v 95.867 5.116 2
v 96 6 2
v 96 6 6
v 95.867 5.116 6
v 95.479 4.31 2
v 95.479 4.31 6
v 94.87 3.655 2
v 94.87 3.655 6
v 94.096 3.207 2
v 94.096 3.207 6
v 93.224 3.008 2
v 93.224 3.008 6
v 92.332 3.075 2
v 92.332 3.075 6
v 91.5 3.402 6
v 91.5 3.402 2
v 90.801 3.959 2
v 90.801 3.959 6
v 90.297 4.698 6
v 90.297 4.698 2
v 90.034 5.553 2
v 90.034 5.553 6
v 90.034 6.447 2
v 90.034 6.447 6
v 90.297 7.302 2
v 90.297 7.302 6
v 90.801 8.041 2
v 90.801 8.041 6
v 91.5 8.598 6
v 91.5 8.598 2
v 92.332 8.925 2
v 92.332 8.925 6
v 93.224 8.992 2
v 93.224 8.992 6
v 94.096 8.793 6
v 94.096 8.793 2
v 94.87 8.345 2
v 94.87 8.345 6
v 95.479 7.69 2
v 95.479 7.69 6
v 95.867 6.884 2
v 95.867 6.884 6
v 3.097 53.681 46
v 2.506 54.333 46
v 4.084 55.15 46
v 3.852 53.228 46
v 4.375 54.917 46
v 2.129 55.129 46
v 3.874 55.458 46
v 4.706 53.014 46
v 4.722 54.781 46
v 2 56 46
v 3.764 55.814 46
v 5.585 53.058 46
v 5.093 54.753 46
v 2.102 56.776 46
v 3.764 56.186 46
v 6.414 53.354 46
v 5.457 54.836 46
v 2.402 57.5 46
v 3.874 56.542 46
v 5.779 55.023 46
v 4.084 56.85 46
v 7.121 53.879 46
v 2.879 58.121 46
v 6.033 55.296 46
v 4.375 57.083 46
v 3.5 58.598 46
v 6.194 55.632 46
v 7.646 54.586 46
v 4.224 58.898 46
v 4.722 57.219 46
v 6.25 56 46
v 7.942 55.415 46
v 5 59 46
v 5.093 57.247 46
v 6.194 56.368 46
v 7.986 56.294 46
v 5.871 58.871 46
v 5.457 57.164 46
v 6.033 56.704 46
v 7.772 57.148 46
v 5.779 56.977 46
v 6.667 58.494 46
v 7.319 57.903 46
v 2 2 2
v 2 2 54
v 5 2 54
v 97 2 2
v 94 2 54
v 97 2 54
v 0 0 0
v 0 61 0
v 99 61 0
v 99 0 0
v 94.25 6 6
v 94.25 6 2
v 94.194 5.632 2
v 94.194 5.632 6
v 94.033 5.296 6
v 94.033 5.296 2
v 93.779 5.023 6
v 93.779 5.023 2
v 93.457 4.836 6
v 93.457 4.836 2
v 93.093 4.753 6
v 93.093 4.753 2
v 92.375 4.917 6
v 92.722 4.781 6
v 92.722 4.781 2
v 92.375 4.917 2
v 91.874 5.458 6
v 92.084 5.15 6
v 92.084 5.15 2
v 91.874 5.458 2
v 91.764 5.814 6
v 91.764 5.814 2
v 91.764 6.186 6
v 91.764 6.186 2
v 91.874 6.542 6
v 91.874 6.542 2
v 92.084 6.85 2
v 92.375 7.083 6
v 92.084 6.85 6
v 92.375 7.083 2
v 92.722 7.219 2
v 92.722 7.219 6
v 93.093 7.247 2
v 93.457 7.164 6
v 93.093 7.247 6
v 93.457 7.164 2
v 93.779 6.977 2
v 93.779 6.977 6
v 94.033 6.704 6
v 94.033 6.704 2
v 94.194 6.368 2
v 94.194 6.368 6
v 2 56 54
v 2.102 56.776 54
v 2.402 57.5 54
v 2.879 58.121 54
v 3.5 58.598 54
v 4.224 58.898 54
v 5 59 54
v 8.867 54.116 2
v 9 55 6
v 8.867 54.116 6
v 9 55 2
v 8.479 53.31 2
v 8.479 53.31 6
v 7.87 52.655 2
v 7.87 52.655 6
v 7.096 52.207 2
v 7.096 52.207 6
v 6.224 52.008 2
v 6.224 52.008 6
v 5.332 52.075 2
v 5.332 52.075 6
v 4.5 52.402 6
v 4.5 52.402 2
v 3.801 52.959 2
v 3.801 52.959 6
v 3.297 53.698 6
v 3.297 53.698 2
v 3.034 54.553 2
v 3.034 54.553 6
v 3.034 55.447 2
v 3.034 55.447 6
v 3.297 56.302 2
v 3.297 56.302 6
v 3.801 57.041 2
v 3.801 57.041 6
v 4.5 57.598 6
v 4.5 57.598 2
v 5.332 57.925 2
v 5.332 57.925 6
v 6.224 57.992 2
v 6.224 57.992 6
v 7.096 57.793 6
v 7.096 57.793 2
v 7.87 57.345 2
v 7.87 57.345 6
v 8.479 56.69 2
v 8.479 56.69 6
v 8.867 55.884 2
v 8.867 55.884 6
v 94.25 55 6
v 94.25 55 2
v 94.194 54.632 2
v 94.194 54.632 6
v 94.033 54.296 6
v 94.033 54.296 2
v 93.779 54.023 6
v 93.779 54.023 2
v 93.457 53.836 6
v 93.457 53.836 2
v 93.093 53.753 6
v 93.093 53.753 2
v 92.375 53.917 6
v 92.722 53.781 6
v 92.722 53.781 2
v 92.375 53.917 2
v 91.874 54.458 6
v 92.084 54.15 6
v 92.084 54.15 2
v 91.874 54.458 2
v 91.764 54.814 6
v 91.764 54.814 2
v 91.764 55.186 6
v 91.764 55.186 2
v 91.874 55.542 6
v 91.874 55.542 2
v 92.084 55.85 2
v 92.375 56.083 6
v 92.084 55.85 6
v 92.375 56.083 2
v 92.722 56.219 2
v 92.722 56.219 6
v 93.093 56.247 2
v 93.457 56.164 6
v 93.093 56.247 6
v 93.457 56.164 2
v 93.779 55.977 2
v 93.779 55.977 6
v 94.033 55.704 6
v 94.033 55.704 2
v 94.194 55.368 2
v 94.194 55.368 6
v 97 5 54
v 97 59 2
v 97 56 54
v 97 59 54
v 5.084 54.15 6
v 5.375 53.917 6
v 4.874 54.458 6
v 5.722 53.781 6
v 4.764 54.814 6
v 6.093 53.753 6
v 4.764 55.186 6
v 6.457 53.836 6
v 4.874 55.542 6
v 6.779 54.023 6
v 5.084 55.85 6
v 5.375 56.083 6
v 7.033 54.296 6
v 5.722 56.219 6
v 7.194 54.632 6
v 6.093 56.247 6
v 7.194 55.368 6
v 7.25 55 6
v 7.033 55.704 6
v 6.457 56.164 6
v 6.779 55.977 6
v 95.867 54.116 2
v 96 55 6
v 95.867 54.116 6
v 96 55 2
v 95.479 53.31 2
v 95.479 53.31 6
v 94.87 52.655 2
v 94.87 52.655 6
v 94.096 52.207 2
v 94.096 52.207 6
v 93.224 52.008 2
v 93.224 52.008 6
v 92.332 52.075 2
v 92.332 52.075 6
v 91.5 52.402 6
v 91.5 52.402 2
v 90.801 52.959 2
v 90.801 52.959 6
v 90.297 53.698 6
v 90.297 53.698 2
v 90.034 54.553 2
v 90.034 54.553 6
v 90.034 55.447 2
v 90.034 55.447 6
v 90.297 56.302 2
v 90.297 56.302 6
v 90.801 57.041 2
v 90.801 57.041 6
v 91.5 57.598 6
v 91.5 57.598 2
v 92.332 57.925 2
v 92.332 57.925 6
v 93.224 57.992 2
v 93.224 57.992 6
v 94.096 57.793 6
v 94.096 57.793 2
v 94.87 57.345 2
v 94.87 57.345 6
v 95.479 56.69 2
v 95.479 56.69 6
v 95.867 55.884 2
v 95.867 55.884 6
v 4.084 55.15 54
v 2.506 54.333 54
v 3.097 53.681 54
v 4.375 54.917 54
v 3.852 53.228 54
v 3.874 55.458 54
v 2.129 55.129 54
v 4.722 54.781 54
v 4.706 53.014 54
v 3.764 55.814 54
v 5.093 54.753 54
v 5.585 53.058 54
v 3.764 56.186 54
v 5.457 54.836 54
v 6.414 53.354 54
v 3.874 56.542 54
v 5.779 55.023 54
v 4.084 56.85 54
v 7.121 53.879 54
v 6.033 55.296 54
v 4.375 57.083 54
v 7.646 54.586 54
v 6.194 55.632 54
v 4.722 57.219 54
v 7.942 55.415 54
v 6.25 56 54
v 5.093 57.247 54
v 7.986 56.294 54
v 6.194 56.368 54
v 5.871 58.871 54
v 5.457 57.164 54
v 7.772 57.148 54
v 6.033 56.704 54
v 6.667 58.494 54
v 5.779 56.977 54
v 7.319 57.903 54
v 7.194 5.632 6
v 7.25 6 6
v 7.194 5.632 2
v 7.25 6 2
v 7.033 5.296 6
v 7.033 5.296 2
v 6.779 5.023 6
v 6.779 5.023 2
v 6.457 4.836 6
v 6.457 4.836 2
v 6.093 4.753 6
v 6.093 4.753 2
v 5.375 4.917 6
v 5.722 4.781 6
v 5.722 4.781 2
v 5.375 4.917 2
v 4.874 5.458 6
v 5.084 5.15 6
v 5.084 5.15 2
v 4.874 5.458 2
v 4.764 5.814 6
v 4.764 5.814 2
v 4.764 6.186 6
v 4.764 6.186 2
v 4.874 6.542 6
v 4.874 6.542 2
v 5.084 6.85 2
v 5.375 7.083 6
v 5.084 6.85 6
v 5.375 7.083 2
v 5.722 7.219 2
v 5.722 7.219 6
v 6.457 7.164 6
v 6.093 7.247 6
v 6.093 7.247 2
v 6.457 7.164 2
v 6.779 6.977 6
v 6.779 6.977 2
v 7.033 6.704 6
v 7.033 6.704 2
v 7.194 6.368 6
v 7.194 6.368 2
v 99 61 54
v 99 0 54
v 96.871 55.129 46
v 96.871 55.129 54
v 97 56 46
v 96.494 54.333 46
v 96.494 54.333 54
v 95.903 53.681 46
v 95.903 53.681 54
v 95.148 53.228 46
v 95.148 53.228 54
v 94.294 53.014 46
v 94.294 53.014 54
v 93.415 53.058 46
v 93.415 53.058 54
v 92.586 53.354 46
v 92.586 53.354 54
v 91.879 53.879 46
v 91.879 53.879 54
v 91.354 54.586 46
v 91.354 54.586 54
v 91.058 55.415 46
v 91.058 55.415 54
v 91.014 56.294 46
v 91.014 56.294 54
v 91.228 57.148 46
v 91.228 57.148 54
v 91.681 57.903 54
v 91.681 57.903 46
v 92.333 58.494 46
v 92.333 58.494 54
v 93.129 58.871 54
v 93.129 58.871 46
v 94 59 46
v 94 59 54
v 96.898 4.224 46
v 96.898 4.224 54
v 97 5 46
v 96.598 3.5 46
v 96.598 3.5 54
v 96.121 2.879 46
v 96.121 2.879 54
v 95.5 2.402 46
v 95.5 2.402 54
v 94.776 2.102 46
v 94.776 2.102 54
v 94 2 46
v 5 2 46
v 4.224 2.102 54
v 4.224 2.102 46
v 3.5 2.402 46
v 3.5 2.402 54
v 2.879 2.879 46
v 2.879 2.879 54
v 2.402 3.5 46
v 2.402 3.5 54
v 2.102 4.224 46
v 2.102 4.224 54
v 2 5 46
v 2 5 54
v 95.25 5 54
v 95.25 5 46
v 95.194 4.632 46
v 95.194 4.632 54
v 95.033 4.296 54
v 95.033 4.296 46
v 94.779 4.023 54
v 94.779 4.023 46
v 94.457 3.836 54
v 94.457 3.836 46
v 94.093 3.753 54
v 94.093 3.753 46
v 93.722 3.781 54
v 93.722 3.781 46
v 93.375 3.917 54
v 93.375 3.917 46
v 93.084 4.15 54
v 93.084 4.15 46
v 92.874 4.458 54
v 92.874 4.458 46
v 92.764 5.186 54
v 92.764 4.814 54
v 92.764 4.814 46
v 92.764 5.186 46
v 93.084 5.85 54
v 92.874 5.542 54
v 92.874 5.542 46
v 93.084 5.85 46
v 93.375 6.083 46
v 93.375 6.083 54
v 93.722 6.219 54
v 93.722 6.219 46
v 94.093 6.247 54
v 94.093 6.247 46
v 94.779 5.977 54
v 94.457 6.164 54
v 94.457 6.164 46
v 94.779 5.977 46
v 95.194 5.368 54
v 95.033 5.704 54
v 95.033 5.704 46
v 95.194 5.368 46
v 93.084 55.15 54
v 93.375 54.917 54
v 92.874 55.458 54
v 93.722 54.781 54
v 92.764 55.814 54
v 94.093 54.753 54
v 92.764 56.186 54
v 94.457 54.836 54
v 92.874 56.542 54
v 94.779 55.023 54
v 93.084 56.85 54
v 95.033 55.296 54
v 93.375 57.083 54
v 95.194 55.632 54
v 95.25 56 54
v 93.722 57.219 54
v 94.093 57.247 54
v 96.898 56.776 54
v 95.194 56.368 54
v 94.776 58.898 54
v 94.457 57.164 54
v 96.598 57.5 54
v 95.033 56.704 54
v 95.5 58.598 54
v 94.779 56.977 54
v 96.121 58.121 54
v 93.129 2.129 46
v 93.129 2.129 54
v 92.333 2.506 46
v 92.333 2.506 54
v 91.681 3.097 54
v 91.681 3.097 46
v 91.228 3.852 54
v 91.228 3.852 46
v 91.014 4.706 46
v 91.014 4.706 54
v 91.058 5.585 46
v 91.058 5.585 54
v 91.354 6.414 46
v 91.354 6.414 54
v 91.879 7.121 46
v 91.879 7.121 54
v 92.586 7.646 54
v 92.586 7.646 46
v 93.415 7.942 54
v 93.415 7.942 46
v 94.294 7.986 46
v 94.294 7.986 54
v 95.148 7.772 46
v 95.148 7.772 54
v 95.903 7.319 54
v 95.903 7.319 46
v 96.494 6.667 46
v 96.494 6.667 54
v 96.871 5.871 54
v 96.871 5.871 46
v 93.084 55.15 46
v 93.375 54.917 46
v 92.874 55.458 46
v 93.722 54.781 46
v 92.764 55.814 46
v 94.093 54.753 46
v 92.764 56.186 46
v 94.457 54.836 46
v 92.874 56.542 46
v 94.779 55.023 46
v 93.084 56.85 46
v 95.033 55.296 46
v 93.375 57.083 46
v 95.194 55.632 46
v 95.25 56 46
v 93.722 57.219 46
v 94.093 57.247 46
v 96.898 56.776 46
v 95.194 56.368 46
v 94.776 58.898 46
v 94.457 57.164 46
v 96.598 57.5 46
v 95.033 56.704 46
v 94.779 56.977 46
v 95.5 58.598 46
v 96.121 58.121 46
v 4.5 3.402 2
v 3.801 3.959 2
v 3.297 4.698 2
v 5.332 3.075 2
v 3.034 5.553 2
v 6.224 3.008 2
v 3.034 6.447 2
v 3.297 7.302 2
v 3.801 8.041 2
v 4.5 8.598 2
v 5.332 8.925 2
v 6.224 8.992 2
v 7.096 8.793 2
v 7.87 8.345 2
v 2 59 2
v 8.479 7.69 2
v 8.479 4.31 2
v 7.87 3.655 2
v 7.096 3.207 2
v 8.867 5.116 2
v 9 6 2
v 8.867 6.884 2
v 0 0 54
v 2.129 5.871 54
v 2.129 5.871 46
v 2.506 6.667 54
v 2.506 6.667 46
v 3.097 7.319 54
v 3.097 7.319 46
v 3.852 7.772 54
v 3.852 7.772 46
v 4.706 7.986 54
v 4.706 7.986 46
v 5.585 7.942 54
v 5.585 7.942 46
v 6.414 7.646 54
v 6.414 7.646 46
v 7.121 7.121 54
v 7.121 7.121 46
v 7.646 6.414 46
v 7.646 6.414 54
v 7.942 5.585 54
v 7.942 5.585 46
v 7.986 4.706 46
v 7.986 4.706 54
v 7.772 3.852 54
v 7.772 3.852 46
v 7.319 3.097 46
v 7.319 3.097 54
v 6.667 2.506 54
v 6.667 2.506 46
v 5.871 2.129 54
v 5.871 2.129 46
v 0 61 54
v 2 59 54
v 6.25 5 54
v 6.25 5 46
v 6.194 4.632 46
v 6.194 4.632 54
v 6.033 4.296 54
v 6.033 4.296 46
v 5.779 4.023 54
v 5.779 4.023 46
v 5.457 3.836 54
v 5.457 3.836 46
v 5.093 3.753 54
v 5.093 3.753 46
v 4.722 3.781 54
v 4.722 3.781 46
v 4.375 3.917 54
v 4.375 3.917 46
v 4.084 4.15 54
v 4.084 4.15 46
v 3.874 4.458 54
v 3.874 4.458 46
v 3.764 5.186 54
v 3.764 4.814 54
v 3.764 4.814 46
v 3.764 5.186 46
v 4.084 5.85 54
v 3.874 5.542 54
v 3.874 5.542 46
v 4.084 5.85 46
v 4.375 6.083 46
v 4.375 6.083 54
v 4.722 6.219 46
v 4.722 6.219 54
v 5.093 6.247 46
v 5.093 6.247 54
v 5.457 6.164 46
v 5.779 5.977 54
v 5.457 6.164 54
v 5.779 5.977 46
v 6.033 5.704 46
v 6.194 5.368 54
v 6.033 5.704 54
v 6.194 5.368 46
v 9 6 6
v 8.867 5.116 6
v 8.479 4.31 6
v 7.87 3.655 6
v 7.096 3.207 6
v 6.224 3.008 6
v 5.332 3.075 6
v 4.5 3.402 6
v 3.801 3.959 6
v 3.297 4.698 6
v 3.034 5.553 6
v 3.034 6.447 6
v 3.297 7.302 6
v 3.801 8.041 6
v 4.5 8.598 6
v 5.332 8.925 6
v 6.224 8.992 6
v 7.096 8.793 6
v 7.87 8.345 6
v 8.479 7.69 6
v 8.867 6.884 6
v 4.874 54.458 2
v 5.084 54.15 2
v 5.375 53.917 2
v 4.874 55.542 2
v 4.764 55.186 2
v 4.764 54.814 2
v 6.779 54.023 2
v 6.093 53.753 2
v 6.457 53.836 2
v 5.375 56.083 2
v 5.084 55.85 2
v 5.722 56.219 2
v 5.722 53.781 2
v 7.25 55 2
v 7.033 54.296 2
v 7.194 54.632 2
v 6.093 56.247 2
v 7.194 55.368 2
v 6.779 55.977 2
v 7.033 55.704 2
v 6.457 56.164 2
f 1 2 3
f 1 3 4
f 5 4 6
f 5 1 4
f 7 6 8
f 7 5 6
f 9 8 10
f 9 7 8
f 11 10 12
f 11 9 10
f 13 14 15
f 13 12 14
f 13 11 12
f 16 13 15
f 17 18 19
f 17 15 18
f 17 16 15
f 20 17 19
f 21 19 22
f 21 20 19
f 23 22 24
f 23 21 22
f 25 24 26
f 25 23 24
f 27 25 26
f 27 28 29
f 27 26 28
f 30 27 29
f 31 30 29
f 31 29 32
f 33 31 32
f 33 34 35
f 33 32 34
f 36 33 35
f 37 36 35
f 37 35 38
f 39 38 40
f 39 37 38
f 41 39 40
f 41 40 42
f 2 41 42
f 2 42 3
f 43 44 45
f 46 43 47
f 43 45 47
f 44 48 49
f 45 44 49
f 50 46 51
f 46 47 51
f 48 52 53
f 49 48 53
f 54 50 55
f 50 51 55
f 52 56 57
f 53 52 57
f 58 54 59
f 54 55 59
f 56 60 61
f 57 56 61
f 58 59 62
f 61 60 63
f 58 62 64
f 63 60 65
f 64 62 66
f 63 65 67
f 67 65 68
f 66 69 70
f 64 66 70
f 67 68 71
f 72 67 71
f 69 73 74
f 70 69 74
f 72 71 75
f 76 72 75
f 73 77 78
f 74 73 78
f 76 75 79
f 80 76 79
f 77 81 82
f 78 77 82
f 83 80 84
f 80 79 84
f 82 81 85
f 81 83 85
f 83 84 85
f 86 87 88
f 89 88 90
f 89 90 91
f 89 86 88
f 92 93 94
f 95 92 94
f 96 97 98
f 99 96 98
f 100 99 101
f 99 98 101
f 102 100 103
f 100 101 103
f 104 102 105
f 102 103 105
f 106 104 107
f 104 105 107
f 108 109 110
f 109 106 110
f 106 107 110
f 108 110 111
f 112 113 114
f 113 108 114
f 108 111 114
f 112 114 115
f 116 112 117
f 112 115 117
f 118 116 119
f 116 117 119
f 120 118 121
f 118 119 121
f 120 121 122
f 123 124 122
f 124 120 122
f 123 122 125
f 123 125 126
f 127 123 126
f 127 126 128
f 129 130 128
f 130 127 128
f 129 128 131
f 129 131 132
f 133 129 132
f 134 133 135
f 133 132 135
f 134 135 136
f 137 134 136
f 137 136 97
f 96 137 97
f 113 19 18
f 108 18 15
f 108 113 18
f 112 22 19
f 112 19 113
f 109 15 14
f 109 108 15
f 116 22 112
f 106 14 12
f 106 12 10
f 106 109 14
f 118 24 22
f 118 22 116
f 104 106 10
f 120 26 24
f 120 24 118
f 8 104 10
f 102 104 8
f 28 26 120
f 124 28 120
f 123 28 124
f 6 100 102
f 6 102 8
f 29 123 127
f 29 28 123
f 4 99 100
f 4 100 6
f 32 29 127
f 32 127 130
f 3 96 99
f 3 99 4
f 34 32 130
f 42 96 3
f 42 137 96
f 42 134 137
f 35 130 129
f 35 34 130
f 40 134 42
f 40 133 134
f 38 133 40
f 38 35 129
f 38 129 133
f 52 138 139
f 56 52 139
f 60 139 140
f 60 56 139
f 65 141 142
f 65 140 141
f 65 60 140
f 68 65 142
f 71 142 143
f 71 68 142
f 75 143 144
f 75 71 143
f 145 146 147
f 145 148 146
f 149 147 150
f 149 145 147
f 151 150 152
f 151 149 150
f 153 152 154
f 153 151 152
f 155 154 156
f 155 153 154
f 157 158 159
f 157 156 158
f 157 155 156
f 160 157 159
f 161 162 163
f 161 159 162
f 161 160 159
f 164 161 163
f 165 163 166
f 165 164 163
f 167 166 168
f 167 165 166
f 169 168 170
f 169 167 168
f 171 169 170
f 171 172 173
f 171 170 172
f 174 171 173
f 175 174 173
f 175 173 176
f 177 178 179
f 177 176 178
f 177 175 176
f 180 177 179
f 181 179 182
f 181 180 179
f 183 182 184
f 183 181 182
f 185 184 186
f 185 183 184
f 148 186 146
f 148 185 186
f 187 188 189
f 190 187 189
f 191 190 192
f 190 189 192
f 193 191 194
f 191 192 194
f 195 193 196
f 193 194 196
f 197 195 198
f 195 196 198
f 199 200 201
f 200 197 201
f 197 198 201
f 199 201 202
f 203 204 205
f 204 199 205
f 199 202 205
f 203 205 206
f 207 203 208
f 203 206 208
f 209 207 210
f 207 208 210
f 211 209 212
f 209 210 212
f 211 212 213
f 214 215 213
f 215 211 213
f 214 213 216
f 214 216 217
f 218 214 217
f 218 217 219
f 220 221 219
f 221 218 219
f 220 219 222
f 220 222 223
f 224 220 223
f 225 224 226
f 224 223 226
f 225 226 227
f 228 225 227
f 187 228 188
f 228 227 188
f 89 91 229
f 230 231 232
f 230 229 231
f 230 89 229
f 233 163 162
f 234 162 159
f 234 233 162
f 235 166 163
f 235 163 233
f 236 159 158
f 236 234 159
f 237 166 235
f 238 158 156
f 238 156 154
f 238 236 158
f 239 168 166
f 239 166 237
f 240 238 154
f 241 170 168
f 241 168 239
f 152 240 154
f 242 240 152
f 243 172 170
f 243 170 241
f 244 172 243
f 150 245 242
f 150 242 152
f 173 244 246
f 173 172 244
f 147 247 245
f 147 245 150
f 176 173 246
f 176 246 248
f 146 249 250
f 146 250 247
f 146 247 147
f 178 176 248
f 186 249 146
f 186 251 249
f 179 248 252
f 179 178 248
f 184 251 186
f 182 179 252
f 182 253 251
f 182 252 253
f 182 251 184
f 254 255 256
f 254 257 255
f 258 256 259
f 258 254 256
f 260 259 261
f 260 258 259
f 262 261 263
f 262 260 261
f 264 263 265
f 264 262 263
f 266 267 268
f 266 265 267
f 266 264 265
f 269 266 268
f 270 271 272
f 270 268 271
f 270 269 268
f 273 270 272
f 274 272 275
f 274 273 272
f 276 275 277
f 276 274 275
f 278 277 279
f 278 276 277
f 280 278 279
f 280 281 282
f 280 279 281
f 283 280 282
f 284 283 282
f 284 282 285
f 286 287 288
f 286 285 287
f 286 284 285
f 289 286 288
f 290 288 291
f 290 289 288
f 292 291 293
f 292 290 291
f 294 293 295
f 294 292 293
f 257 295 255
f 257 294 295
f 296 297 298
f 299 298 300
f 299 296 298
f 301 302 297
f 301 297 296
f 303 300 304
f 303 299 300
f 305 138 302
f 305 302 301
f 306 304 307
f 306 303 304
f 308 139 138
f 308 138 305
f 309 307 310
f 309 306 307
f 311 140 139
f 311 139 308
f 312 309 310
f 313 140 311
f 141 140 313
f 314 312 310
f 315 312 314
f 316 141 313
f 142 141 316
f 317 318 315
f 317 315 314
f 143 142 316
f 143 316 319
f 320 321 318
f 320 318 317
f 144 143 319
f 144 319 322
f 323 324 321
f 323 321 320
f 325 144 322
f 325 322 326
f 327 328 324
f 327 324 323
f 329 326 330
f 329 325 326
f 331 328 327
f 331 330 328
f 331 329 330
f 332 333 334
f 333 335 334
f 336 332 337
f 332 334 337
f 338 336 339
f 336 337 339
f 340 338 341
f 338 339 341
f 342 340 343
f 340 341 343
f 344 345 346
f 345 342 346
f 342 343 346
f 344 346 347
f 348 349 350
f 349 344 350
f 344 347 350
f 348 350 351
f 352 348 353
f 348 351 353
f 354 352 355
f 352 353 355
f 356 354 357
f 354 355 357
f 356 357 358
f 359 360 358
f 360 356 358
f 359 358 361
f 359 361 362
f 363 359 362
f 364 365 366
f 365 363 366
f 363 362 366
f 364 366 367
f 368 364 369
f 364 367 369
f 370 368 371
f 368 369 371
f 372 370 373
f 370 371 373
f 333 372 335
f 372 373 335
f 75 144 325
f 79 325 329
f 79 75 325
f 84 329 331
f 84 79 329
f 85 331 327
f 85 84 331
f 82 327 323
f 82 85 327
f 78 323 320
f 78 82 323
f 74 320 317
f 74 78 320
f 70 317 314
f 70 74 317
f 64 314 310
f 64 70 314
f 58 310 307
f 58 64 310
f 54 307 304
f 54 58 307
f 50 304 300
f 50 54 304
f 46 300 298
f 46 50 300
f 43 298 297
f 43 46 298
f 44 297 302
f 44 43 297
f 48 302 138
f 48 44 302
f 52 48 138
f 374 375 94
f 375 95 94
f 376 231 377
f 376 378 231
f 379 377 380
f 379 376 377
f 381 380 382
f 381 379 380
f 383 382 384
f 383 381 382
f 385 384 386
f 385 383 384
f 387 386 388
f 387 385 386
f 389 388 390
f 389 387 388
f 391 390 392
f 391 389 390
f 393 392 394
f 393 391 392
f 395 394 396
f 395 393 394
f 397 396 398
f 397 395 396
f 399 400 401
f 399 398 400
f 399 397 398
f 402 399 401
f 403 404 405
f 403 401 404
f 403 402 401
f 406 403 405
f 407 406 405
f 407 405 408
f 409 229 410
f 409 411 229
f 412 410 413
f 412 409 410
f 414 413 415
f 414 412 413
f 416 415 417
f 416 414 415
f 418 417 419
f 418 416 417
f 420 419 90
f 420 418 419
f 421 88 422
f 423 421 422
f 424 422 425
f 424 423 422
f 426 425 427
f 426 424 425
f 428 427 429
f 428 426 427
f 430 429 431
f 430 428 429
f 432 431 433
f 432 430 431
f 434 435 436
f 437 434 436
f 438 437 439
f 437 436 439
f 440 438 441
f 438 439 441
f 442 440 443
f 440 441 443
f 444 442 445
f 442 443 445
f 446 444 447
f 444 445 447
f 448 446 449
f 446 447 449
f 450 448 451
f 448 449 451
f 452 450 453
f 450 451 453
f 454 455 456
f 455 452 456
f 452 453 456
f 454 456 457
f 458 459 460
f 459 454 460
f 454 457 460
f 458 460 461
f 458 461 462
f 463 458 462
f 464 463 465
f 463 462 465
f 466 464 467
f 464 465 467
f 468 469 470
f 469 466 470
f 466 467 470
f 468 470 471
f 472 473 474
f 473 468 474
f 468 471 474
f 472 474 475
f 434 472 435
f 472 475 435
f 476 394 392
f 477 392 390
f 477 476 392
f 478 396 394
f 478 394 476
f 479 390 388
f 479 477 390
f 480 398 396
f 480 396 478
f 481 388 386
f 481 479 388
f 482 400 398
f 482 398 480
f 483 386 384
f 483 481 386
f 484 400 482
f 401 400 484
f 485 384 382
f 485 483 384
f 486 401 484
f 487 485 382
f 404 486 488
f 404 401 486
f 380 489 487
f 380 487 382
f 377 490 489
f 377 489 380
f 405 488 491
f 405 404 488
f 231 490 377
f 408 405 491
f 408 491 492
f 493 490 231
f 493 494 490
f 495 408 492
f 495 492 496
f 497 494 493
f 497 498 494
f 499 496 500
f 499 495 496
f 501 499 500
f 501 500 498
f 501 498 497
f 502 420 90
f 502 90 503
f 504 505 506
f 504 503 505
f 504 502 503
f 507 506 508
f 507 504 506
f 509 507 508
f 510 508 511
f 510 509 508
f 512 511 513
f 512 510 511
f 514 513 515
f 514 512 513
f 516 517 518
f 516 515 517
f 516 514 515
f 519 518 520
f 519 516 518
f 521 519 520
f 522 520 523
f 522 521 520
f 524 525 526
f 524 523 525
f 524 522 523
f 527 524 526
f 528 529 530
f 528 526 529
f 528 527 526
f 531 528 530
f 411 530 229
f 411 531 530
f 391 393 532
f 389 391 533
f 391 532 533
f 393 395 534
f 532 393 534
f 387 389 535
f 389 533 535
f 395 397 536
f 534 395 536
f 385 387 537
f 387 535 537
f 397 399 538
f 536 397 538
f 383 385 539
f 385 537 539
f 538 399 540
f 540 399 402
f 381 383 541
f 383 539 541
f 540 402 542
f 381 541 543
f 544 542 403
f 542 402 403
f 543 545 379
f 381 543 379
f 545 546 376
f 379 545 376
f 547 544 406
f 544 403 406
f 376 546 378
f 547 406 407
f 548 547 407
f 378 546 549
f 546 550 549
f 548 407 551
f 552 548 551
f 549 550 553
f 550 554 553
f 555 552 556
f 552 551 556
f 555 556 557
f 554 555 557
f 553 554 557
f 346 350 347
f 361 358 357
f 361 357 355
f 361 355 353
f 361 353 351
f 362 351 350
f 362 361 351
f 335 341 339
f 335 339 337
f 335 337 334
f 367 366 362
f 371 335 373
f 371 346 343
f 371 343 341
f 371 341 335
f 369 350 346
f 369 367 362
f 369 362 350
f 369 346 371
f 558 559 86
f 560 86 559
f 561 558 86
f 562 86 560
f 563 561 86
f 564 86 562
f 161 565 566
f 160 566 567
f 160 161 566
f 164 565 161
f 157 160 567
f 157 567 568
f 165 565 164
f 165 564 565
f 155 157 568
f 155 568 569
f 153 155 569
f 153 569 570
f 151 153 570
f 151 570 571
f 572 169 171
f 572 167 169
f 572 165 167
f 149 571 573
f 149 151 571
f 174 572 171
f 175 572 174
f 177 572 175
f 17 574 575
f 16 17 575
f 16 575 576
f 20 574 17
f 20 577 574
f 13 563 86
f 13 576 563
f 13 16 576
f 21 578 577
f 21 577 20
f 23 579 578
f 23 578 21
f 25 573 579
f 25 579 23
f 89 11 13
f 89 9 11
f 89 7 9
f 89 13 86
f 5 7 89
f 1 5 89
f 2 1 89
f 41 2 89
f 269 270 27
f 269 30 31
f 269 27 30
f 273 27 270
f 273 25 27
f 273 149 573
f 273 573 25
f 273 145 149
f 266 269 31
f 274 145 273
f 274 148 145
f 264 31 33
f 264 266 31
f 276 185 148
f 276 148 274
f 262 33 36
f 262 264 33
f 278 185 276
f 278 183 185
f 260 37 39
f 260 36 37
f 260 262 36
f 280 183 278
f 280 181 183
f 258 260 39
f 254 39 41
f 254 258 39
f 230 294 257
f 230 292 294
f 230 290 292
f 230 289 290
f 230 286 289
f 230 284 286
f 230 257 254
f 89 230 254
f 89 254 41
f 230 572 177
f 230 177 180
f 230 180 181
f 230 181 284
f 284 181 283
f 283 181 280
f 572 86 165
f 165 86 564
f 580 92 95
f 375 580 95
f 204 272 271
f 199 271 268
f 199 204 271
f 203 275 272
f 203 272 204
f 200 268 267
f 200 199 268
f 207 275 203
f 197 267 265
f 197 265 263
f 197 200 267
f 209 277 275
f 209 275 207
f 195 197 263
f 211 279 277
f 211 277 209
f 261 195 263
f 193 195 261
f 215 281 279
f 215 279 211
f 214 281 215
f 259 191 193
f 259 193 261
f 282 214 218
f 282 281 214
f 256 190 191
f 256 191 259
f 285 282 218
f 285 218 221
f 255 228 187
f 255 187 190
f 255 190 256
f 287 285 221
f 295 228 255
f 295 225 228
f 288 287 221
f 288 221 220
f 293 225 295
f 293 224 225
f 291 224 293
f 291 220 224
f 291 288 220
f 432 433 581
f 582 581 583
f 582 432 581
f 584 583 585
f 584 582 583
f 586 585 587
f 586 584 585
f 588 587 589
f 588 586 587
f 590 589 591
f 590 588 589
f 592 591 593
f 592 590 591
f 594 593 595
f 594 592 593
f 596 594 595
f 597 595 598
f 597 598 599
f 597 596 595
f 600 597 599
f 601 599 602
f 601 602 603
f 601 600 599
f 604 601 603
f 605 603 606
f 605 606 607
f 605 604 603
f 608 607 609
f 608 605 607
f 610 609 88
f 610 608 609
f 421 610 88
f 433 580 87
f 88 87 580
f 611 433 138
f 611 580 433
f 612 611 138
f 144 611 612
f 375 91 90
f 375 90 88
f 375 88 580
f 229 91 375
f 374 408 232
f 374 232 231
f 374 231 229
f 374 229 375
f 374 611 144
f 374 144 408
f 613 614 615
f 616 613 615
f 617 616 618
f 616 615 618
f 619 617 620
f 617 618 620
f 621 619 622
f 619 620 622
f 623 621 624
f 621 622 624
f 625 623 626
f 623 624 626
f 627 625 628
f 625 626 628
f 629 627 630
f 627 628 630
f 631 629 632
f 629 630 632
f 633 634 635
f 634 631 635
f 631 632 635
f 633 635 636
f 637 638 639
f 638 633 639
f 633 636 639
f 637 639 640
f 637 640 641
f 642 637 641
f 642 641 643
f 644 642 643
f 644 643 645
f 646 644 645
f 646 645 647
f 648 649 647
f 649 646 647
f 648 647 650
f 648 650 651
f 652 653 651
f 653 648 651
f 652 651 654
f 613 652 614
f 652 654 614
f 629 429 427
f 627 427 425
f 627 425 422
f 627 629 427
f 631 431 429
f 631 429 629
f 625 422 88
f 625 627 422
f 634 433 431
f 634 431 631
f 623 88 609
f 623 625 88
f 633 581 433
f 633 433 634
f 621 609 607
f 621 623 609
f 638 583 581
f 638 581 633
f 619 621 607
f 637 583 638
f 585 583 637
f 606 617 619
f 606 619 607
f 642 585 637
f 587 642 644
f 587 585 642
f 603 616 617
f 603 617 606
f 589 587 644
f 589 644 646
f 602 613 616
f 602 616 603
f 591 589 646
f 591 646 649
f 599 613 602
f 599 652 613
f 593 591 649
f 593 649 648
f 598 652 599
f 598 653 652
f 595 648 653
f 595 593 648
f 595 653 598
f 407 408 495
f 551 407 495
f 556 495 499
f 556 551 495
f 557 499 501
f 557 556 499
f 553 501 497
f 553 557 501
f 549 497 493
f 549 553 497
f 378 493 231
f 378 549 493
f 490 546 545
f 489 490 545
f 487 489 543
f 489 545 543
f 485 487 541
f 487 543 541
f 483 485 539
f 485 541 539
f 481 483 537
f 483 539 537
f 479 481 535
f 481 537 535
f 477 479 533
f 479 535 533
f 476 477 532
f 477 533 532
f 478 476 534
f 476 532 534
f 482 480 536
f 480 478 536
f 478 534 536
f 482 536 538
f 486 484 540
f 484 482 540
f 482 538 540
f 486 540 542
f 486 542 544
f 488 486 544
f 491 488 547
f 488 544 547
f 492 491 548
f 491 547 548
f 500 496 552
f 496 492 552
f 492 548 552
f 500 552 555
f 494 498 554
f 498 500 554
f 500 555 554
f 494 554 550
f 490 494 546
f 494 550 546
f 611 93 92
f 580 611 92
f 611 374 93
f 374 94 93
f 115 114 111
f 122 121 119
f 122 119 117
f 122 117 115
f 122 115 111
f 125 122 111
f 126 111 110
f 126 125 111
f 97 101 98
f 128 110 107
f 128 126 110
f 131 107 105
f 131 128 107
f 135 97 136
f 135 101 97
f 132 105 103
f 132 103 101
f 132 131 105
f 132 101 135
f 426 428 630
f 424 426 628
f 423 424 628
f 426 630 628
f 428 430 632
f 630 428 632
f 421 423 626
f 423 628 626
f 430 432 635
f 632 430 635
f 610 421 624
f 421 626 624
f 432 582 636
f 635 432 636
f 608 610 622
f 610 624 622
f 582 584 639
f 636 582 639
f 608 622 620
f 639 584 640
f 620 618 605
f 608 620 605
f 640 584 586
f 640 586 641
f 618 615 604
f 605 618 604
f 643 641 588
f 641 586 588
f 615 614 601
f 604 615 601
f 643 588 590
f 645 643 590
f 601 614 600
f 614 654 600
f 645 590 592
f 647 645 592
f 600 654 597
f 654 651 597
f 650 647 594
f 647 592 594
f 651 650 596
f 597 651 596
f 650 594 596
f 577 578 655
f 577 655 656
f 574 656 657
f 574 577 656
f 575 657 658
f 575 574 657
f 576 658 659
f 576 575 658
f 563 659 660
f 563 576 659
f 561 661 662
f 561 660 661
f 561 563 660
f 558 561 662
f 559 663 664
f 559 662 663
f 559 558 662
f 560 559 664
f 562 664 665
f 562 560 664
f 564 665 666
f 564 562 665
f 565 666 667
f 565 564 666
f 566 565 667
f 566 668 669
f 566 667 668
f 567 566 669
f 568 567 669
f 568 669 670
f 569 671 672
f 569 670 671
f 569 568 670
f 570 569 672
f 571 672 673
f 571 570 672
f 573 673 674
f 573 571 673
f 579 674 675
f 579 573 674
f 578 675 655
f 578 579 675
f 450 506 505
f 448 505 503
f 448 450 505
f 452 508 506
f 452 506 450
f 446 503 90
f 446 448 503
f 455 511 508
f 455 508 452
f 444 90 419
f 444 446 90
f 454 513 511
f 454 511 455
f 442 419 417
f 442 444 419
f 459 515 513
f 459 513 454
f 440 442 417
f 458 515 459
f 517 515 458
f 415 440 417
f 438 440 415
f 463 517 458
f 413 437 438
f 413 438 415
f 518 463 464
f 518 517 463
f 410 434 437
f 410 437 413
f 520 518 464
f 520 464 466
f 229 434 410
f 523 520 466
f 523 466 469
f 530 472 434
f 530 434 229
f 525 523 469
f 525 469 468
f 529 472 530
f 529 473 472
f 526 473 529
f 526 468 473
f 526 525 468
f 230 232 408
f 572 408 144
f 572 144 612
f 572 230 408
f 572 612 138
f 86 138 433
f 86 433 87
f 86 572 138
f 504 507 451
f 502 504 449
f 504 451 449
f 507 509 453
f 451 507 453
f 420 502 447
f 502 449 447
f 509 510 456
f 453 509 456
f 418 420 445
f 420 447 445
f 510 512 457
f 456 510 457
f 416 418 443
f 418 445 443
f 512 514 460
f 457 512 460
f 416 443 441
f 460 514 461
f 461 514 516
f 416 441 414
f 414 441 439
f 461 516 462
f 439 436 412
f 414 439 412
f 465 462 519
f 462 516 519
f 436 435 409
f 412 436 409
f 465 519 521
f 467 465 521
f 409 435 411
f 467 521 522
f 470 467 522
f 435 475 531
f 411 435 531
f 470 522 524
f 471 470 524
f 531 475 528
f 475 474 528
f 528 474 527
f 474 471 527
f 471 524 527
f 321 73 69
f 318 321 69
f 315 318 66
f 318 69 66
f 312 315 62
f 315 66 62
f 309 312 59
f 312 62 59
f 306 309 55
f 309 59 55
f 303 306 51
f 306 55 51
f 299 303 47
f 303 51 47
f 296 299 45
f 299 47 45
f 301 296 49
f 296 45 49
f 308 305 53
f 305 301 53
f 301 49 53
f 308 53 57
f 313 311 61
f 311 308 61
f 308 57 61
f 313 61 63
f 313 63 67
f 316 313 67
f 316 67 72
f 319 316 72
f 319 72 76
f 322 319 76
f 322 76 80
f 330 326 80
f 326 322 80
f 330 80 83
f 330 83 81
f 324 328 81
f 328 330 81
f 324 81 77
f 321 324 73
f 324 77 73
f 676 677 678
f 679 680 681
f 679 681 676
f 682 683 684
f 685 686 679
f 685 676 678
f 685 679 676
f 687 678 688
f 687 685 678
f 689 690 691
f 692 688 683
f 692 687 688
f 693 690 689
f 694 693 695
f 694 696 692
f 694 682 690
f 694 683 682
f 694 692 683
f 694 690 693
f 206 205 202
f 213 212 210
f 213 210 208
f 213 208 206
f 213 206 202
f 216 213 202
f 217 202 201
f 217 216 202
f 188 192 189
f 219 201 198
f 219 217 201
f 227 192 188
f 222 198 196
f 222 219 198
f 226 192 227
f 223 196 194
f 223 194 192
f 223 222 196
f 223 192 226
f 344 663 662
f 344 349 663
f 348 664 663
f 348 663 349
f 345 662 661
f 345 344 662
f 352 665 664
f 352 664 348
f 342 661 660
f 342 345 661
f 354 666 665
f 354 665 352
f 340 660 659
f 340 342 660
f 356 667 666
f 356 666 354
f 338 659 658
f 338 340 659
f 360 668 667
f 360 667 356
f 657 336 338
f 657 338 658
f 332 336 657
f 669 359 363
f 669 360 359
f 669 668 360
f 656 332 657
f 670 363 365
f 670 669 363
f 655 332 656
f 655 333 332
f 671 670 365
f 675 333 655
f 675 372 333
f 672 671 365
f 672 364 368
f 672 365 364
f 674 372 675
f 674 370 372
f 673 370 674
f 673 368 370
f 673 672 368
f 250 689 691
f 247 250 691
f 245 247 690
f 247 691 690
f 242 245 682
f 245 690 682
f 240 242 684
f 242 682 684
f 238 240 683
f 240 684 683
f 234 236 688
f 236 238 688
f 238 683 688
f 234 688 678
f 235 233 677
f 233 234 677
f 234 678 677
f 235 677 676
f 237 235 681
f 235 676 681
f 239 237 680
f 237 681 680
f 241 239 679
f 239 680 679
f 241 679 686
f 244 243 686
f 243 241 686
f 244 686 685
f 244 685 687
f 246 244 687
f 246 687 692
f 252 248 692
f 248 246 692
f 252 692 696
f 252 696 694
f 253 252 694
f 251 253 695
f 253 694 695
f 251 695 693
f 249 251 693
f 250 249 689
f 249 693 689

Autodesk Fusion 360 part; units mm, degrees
sketch "BaseOuterProfile" plane through (0, 0, 0) normal (0, 0, 1) x (1, 0, 0)
  line L0 (0, 0) -> (99, 0)
  line L1 (99, 0) -> (99, 61)
  line L2 (99, 61) -> (0, 61)
  line L3 (0, 61) -> (0, 0)
extrude "Extrude1" add sketch "BaseOuterProfile" along normal blind 54 makes body 1
shell "Shell1" thickness 2 removed faces 1 at (33, 40.6667, 54) on bodies 1
ref_plane "WorkPlane1" through (0, 0, 2) normal (0, 0, 1) x (1, 0, 0)
sketch "StandoffPosts" plane through (0, 0, 2) normal (0, 0, 1) x (1, 0, 0)
  circle A0 centre (6, 6) radius 3
  circle A1 centre (93, 6) radius 3
  circle A2 centre (6, 55) radius 3
  circle A3 centre (93, 55) radius 3
extrude "Extrude2" add sketch "StandoffPosts" along normal blind 4 contours A0 bodies 1
extrude "Extrude3" add sketch "StandoffPosts" along normal blind 4 contours A2 bodies 1
extrude "Extrude4" add sketch "StandoffPosts" along normal blind 4 contours A1 bodies 1
extrude "Extrude5" add sketch "StandoffPosts" along normal blind 4 contours A3 bodies 1
sketch "StandoffPilotHoles" plane through (0, 0, 2) normal (0, 0, 1) x (1, 0, 0)
  circle A0 centre (6, 6) radius 1.25
  circle A1 centre (93, 6) radius 1.25
  circle A2 centre (6, 55) radius 1.25
  circle A3 centre (93, 55) radius 1.25
extrude "Extrude6" cut sketch "StandoffPilotHoles" along normal blind 4 contours A0 bodies 1
extrude "Extrude7" cut sketch "StandoffPilotHoles" along normal blind 4 contours A2 bodies 1
extrude "Extrude8" cut sketch "StandoffPilotHoles" along normal blind 4 contours A1 bodies 1
extrude "Extrude9" cut sketch "StandoffPilotHoles" along normal blind 4 contours A3 bodies 1
ref_plane "WorkPlane2" through (0, 0, 46) normal (0, 0, 1) x (1, 0, 0)
sketch "LidBossPosts" plane through (0, 0, 46) normal (0, 0, 1) x (1, 0, 0)
  circle A0 centre (5, 5) radius 3
  circle A1 centre (94, 5) radius 3
  circle A2 centre (5, 56) radius 3
  circle A3 centre (94, 56) radius 3
extrude "Extrude10" add sketch "LidBossPosts" along normal blind 8 contours A0 bodies 1
extrude "Extrude11" add sketch "LidBossPosts" along normal blind 8 contours A2 bodies 1
extrude "Extrude12" add sketch "LidBossPosts" along normal blind 8 contours A1 bodies 1
extrude "Extrude13" add sketch "LidBossPosts" along normal blind 8 contours A3 bodies 1
sketch "LidBossPilotHoles" plane through (0, 0, 46) normal (0, 0, 1) x (1, 0, 0)
  circle A0 centre (5, 5) radius 1.25
  circle A1 centre (94, 5) radius 1.25
  circle A2 centre (5, 56) radius 1.25
  circle A3 centre (94, 56) radius 1.25
extrude "Extrude14" cut sketch "LidBossPilotHoles" along normal blind 8 contours A0 bodies 1
extrude "Extrude15" cut sketch "LidBossPilotHoles" along normal blind 8 contours A2 bodies 1
extrude "Extrude16" cut sketch "LidBossPilotHoles" along normal blind 8 contours A1 bodies 1
extrude "Extrude17" cut sketch "LidBossPilotHoles" along normal blind 8 contours A3 bodies 1
ref_plane "WorkPlane3" through (0, 0, 54) normal (0, 0, 1) x (1, 0, 0)
sketch "LidOuterProfile" plane through (0, 0, 54) normal (0, 0, 1) x (1, 0, 0)
  line L0 (0, 0) -> (99, 0)
  line L1 (99, 0) -> (99, 61)
  line L2 (99, 61) -> (0, 61)
  line L3 (0, 61) -> (0, 0)
extrude "Extrude18" add sketch "LidOuterProfile" along normal blind 2 separate body makes body 2
sketch "LidClearanceHoles" plane through (0, 0, 54) normal (0, 0, 1) x (1, 0, 0)
  circle A0 centre (5, 5) radius 1.7
  circle A1 centre (94, 5) radius 1.7
  circle A2 centre (5, 56) radius 1.7
  circle A3 centre (94, 56) radius 1.7
extrude "Extrude19" cut sketch "LidClearanceHoles" along normal blind 2 contours A0 bodies 2
extrude "Extrude20" cut sketch "LidClearanceHoles" along normal blind 2 contours A2 bodies 2
extrude "Extrude21" cut sketch "LidClearanceHoles" along normal blind 2 contours A1 bodies 2
extrude "Extrude22" cut sketch "LidClearanceHoles" along normal blind 2 contours A3 bodies 2
hidden bodies 2
